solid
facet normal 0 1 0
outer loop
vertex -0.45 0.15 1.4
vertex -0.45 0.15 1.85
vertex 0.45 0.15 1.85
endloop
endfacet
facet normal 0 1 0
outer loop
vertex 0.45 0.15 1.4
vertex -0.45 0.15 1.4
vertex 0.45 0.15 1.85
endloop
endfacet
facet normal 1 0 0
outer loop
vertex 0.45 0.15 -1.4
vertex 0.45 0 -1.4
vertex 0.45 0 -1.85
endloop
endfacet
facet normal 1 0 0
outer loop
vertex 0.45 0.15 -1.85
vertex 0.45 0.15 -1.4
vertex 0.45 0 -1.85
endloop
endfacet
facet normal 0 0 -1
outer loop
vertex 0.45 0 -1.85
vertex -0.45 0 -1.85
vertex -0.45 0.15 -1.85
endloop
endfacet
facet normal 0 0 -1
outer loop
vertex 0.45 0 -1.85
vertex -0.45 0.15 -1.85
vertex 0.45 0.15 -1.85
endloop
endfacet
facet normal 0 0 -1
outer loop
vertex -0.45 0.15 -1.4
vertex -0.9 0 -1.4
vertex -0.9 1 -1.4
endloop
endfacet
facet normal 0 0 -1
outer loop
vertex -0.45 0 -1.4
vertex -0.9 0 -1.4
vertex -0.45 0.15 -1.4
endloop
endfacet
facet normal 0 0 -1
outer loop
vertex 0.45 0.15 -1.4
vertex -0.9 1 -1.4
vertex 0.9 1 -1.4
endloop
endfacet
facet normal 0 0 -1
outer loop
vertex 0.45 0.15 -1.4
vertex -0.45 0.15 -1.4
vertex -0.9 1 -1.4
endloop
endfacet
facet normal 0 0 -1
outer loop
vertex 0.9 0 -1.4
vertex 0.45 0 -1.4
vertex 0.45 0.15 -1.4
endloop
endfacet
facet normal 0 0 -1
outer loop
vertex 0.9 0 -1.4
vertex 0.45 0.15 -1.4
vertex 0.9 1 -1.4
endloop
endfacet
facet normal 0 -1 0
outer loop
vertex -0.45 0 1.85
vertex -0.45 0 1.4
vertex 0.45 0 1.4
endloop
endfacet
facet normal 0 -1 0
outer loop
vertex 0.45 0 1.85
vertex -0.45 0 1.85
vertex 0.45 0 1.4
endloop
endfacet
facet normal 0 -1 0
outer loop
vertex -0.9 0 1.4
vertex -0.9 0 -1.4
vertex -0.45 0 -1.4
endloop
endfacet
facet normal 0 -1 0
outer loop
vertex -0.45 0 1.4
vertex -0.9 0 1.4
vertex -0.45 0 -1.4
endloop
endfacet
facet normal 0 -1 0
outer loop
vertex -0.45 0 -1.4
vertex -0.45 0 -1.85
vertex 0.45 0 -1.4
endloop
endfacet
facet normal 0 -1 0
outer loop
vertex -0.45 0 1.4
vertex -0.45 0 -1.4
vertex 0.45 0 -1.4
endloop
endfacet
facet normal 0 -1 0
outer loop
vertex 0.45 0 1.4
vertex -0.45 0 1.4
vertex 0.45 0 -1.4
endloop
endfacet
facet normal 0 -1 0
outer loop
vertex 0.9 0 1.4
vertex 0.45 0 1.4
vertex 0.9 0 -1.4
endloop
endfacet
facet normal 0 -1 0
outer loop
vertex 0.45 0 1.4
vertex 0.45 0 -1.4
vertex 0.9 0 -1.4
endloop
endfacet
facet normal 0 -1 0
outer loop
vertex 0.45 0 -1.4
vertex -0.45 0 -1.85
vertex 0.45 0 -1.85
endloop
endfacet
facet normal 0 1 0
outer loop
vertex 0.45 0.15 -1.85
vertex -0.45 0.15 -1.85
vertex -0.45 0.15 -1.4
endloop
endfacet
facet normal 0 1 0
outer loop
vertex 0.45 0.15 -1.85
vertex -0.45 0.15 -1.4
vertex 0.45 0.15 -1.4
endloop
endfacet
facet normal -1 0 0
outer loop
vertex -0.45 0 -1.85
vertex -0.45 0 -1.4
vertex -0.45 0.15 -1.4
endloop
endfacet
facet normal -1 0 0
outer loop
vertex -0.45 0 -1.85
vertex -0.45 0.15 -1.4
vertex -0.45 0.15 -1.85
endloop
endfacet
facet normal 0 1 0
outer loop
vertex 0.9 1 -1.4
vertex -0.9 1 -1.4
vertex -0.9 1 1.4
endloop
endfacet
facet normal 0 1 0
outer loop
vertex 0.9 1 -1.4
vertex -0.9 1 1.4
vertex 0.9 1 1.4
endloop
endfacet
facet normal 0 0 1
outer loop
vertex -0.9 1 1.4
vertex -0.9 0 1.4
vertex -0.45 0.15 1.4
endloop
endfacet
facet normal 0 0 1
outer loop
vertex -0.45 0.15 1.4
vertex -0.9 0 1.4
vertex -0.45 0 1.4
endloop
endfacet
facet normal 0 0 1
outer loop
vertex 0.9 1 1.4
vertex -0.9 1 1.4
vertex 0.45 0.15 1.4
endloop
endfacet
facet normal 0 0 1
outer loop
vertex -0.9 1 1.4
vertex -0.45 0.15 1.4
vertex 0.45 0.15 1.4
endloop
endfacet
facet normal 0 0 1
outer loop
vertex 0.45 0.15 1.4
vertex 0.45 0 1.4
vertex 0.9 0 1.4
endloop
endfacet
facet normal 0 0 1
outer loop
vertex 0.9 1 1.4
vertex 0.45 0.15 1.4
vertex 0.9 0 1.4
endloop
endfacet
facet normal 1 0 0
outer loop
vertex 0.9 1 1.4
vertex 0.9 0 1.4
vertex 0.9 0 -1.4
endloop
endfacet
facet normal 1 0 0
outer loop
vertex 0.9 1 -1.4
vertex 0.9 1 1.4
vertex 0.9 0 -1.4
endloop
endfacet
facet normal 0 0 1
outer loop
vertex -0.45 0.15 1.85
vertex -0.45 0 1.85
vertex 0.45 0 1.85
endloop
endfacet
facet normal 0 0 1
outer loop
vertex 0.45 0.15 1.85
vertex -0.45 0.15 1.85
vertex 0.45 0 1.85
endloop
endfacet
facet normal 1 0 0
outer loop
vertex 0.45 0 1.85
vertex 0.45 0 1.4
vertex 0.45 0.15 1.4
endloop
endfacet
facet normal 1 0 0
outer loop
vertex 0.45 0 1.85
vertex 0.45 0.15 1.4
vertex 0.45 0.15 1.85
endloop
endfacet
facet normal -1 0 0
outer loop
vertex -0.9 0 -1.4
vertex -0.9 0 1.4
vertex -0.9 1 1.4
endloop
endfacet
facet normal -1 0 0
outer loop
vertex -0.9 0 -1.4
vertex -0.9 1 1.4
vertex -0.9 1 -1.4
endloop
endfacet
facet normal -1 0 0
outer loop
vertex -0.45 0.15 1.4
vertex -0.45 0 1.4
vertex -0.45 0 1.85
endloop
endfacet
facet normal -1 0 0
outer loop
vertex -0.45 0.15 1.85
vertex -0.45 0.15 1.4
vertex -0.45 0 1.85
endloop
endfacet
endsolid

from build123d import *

# Parameters (mm, degrees)
BASES_W    = 1.8
BASES_H    = 2.8
BASE_DEPTH = 1
LEGS_W     = 0.9
LEGS_H     = 0.45
LEG_DEPTH  = 0.15


with BuildPart() as part:
    # BaseS → Base (new body)
    with BuildSketch(Plane(origin=(0, 0, 0), x_dir=(1, 0, 0), z_dir=(0, 1, 0))):
        Rectangle(BASES_W, BASES_H)
    extrude(amount=BASE_DEPTH)

    # LegS → Leg (add)
    with BuildSketch(Plane(origin=(0, 0, 0), x_dir=(1, 0, 0), z_dir=(0, 1, 0))):
        with Locations((0, 1.625)):
            Rectangle(LEGS_W, LEGS_H)
    leg = extrude(amount=LEG_DEPTH)

    # LVM: Leg across plane
    add(leg.mirror(Plane.XY))


solid = part.part
